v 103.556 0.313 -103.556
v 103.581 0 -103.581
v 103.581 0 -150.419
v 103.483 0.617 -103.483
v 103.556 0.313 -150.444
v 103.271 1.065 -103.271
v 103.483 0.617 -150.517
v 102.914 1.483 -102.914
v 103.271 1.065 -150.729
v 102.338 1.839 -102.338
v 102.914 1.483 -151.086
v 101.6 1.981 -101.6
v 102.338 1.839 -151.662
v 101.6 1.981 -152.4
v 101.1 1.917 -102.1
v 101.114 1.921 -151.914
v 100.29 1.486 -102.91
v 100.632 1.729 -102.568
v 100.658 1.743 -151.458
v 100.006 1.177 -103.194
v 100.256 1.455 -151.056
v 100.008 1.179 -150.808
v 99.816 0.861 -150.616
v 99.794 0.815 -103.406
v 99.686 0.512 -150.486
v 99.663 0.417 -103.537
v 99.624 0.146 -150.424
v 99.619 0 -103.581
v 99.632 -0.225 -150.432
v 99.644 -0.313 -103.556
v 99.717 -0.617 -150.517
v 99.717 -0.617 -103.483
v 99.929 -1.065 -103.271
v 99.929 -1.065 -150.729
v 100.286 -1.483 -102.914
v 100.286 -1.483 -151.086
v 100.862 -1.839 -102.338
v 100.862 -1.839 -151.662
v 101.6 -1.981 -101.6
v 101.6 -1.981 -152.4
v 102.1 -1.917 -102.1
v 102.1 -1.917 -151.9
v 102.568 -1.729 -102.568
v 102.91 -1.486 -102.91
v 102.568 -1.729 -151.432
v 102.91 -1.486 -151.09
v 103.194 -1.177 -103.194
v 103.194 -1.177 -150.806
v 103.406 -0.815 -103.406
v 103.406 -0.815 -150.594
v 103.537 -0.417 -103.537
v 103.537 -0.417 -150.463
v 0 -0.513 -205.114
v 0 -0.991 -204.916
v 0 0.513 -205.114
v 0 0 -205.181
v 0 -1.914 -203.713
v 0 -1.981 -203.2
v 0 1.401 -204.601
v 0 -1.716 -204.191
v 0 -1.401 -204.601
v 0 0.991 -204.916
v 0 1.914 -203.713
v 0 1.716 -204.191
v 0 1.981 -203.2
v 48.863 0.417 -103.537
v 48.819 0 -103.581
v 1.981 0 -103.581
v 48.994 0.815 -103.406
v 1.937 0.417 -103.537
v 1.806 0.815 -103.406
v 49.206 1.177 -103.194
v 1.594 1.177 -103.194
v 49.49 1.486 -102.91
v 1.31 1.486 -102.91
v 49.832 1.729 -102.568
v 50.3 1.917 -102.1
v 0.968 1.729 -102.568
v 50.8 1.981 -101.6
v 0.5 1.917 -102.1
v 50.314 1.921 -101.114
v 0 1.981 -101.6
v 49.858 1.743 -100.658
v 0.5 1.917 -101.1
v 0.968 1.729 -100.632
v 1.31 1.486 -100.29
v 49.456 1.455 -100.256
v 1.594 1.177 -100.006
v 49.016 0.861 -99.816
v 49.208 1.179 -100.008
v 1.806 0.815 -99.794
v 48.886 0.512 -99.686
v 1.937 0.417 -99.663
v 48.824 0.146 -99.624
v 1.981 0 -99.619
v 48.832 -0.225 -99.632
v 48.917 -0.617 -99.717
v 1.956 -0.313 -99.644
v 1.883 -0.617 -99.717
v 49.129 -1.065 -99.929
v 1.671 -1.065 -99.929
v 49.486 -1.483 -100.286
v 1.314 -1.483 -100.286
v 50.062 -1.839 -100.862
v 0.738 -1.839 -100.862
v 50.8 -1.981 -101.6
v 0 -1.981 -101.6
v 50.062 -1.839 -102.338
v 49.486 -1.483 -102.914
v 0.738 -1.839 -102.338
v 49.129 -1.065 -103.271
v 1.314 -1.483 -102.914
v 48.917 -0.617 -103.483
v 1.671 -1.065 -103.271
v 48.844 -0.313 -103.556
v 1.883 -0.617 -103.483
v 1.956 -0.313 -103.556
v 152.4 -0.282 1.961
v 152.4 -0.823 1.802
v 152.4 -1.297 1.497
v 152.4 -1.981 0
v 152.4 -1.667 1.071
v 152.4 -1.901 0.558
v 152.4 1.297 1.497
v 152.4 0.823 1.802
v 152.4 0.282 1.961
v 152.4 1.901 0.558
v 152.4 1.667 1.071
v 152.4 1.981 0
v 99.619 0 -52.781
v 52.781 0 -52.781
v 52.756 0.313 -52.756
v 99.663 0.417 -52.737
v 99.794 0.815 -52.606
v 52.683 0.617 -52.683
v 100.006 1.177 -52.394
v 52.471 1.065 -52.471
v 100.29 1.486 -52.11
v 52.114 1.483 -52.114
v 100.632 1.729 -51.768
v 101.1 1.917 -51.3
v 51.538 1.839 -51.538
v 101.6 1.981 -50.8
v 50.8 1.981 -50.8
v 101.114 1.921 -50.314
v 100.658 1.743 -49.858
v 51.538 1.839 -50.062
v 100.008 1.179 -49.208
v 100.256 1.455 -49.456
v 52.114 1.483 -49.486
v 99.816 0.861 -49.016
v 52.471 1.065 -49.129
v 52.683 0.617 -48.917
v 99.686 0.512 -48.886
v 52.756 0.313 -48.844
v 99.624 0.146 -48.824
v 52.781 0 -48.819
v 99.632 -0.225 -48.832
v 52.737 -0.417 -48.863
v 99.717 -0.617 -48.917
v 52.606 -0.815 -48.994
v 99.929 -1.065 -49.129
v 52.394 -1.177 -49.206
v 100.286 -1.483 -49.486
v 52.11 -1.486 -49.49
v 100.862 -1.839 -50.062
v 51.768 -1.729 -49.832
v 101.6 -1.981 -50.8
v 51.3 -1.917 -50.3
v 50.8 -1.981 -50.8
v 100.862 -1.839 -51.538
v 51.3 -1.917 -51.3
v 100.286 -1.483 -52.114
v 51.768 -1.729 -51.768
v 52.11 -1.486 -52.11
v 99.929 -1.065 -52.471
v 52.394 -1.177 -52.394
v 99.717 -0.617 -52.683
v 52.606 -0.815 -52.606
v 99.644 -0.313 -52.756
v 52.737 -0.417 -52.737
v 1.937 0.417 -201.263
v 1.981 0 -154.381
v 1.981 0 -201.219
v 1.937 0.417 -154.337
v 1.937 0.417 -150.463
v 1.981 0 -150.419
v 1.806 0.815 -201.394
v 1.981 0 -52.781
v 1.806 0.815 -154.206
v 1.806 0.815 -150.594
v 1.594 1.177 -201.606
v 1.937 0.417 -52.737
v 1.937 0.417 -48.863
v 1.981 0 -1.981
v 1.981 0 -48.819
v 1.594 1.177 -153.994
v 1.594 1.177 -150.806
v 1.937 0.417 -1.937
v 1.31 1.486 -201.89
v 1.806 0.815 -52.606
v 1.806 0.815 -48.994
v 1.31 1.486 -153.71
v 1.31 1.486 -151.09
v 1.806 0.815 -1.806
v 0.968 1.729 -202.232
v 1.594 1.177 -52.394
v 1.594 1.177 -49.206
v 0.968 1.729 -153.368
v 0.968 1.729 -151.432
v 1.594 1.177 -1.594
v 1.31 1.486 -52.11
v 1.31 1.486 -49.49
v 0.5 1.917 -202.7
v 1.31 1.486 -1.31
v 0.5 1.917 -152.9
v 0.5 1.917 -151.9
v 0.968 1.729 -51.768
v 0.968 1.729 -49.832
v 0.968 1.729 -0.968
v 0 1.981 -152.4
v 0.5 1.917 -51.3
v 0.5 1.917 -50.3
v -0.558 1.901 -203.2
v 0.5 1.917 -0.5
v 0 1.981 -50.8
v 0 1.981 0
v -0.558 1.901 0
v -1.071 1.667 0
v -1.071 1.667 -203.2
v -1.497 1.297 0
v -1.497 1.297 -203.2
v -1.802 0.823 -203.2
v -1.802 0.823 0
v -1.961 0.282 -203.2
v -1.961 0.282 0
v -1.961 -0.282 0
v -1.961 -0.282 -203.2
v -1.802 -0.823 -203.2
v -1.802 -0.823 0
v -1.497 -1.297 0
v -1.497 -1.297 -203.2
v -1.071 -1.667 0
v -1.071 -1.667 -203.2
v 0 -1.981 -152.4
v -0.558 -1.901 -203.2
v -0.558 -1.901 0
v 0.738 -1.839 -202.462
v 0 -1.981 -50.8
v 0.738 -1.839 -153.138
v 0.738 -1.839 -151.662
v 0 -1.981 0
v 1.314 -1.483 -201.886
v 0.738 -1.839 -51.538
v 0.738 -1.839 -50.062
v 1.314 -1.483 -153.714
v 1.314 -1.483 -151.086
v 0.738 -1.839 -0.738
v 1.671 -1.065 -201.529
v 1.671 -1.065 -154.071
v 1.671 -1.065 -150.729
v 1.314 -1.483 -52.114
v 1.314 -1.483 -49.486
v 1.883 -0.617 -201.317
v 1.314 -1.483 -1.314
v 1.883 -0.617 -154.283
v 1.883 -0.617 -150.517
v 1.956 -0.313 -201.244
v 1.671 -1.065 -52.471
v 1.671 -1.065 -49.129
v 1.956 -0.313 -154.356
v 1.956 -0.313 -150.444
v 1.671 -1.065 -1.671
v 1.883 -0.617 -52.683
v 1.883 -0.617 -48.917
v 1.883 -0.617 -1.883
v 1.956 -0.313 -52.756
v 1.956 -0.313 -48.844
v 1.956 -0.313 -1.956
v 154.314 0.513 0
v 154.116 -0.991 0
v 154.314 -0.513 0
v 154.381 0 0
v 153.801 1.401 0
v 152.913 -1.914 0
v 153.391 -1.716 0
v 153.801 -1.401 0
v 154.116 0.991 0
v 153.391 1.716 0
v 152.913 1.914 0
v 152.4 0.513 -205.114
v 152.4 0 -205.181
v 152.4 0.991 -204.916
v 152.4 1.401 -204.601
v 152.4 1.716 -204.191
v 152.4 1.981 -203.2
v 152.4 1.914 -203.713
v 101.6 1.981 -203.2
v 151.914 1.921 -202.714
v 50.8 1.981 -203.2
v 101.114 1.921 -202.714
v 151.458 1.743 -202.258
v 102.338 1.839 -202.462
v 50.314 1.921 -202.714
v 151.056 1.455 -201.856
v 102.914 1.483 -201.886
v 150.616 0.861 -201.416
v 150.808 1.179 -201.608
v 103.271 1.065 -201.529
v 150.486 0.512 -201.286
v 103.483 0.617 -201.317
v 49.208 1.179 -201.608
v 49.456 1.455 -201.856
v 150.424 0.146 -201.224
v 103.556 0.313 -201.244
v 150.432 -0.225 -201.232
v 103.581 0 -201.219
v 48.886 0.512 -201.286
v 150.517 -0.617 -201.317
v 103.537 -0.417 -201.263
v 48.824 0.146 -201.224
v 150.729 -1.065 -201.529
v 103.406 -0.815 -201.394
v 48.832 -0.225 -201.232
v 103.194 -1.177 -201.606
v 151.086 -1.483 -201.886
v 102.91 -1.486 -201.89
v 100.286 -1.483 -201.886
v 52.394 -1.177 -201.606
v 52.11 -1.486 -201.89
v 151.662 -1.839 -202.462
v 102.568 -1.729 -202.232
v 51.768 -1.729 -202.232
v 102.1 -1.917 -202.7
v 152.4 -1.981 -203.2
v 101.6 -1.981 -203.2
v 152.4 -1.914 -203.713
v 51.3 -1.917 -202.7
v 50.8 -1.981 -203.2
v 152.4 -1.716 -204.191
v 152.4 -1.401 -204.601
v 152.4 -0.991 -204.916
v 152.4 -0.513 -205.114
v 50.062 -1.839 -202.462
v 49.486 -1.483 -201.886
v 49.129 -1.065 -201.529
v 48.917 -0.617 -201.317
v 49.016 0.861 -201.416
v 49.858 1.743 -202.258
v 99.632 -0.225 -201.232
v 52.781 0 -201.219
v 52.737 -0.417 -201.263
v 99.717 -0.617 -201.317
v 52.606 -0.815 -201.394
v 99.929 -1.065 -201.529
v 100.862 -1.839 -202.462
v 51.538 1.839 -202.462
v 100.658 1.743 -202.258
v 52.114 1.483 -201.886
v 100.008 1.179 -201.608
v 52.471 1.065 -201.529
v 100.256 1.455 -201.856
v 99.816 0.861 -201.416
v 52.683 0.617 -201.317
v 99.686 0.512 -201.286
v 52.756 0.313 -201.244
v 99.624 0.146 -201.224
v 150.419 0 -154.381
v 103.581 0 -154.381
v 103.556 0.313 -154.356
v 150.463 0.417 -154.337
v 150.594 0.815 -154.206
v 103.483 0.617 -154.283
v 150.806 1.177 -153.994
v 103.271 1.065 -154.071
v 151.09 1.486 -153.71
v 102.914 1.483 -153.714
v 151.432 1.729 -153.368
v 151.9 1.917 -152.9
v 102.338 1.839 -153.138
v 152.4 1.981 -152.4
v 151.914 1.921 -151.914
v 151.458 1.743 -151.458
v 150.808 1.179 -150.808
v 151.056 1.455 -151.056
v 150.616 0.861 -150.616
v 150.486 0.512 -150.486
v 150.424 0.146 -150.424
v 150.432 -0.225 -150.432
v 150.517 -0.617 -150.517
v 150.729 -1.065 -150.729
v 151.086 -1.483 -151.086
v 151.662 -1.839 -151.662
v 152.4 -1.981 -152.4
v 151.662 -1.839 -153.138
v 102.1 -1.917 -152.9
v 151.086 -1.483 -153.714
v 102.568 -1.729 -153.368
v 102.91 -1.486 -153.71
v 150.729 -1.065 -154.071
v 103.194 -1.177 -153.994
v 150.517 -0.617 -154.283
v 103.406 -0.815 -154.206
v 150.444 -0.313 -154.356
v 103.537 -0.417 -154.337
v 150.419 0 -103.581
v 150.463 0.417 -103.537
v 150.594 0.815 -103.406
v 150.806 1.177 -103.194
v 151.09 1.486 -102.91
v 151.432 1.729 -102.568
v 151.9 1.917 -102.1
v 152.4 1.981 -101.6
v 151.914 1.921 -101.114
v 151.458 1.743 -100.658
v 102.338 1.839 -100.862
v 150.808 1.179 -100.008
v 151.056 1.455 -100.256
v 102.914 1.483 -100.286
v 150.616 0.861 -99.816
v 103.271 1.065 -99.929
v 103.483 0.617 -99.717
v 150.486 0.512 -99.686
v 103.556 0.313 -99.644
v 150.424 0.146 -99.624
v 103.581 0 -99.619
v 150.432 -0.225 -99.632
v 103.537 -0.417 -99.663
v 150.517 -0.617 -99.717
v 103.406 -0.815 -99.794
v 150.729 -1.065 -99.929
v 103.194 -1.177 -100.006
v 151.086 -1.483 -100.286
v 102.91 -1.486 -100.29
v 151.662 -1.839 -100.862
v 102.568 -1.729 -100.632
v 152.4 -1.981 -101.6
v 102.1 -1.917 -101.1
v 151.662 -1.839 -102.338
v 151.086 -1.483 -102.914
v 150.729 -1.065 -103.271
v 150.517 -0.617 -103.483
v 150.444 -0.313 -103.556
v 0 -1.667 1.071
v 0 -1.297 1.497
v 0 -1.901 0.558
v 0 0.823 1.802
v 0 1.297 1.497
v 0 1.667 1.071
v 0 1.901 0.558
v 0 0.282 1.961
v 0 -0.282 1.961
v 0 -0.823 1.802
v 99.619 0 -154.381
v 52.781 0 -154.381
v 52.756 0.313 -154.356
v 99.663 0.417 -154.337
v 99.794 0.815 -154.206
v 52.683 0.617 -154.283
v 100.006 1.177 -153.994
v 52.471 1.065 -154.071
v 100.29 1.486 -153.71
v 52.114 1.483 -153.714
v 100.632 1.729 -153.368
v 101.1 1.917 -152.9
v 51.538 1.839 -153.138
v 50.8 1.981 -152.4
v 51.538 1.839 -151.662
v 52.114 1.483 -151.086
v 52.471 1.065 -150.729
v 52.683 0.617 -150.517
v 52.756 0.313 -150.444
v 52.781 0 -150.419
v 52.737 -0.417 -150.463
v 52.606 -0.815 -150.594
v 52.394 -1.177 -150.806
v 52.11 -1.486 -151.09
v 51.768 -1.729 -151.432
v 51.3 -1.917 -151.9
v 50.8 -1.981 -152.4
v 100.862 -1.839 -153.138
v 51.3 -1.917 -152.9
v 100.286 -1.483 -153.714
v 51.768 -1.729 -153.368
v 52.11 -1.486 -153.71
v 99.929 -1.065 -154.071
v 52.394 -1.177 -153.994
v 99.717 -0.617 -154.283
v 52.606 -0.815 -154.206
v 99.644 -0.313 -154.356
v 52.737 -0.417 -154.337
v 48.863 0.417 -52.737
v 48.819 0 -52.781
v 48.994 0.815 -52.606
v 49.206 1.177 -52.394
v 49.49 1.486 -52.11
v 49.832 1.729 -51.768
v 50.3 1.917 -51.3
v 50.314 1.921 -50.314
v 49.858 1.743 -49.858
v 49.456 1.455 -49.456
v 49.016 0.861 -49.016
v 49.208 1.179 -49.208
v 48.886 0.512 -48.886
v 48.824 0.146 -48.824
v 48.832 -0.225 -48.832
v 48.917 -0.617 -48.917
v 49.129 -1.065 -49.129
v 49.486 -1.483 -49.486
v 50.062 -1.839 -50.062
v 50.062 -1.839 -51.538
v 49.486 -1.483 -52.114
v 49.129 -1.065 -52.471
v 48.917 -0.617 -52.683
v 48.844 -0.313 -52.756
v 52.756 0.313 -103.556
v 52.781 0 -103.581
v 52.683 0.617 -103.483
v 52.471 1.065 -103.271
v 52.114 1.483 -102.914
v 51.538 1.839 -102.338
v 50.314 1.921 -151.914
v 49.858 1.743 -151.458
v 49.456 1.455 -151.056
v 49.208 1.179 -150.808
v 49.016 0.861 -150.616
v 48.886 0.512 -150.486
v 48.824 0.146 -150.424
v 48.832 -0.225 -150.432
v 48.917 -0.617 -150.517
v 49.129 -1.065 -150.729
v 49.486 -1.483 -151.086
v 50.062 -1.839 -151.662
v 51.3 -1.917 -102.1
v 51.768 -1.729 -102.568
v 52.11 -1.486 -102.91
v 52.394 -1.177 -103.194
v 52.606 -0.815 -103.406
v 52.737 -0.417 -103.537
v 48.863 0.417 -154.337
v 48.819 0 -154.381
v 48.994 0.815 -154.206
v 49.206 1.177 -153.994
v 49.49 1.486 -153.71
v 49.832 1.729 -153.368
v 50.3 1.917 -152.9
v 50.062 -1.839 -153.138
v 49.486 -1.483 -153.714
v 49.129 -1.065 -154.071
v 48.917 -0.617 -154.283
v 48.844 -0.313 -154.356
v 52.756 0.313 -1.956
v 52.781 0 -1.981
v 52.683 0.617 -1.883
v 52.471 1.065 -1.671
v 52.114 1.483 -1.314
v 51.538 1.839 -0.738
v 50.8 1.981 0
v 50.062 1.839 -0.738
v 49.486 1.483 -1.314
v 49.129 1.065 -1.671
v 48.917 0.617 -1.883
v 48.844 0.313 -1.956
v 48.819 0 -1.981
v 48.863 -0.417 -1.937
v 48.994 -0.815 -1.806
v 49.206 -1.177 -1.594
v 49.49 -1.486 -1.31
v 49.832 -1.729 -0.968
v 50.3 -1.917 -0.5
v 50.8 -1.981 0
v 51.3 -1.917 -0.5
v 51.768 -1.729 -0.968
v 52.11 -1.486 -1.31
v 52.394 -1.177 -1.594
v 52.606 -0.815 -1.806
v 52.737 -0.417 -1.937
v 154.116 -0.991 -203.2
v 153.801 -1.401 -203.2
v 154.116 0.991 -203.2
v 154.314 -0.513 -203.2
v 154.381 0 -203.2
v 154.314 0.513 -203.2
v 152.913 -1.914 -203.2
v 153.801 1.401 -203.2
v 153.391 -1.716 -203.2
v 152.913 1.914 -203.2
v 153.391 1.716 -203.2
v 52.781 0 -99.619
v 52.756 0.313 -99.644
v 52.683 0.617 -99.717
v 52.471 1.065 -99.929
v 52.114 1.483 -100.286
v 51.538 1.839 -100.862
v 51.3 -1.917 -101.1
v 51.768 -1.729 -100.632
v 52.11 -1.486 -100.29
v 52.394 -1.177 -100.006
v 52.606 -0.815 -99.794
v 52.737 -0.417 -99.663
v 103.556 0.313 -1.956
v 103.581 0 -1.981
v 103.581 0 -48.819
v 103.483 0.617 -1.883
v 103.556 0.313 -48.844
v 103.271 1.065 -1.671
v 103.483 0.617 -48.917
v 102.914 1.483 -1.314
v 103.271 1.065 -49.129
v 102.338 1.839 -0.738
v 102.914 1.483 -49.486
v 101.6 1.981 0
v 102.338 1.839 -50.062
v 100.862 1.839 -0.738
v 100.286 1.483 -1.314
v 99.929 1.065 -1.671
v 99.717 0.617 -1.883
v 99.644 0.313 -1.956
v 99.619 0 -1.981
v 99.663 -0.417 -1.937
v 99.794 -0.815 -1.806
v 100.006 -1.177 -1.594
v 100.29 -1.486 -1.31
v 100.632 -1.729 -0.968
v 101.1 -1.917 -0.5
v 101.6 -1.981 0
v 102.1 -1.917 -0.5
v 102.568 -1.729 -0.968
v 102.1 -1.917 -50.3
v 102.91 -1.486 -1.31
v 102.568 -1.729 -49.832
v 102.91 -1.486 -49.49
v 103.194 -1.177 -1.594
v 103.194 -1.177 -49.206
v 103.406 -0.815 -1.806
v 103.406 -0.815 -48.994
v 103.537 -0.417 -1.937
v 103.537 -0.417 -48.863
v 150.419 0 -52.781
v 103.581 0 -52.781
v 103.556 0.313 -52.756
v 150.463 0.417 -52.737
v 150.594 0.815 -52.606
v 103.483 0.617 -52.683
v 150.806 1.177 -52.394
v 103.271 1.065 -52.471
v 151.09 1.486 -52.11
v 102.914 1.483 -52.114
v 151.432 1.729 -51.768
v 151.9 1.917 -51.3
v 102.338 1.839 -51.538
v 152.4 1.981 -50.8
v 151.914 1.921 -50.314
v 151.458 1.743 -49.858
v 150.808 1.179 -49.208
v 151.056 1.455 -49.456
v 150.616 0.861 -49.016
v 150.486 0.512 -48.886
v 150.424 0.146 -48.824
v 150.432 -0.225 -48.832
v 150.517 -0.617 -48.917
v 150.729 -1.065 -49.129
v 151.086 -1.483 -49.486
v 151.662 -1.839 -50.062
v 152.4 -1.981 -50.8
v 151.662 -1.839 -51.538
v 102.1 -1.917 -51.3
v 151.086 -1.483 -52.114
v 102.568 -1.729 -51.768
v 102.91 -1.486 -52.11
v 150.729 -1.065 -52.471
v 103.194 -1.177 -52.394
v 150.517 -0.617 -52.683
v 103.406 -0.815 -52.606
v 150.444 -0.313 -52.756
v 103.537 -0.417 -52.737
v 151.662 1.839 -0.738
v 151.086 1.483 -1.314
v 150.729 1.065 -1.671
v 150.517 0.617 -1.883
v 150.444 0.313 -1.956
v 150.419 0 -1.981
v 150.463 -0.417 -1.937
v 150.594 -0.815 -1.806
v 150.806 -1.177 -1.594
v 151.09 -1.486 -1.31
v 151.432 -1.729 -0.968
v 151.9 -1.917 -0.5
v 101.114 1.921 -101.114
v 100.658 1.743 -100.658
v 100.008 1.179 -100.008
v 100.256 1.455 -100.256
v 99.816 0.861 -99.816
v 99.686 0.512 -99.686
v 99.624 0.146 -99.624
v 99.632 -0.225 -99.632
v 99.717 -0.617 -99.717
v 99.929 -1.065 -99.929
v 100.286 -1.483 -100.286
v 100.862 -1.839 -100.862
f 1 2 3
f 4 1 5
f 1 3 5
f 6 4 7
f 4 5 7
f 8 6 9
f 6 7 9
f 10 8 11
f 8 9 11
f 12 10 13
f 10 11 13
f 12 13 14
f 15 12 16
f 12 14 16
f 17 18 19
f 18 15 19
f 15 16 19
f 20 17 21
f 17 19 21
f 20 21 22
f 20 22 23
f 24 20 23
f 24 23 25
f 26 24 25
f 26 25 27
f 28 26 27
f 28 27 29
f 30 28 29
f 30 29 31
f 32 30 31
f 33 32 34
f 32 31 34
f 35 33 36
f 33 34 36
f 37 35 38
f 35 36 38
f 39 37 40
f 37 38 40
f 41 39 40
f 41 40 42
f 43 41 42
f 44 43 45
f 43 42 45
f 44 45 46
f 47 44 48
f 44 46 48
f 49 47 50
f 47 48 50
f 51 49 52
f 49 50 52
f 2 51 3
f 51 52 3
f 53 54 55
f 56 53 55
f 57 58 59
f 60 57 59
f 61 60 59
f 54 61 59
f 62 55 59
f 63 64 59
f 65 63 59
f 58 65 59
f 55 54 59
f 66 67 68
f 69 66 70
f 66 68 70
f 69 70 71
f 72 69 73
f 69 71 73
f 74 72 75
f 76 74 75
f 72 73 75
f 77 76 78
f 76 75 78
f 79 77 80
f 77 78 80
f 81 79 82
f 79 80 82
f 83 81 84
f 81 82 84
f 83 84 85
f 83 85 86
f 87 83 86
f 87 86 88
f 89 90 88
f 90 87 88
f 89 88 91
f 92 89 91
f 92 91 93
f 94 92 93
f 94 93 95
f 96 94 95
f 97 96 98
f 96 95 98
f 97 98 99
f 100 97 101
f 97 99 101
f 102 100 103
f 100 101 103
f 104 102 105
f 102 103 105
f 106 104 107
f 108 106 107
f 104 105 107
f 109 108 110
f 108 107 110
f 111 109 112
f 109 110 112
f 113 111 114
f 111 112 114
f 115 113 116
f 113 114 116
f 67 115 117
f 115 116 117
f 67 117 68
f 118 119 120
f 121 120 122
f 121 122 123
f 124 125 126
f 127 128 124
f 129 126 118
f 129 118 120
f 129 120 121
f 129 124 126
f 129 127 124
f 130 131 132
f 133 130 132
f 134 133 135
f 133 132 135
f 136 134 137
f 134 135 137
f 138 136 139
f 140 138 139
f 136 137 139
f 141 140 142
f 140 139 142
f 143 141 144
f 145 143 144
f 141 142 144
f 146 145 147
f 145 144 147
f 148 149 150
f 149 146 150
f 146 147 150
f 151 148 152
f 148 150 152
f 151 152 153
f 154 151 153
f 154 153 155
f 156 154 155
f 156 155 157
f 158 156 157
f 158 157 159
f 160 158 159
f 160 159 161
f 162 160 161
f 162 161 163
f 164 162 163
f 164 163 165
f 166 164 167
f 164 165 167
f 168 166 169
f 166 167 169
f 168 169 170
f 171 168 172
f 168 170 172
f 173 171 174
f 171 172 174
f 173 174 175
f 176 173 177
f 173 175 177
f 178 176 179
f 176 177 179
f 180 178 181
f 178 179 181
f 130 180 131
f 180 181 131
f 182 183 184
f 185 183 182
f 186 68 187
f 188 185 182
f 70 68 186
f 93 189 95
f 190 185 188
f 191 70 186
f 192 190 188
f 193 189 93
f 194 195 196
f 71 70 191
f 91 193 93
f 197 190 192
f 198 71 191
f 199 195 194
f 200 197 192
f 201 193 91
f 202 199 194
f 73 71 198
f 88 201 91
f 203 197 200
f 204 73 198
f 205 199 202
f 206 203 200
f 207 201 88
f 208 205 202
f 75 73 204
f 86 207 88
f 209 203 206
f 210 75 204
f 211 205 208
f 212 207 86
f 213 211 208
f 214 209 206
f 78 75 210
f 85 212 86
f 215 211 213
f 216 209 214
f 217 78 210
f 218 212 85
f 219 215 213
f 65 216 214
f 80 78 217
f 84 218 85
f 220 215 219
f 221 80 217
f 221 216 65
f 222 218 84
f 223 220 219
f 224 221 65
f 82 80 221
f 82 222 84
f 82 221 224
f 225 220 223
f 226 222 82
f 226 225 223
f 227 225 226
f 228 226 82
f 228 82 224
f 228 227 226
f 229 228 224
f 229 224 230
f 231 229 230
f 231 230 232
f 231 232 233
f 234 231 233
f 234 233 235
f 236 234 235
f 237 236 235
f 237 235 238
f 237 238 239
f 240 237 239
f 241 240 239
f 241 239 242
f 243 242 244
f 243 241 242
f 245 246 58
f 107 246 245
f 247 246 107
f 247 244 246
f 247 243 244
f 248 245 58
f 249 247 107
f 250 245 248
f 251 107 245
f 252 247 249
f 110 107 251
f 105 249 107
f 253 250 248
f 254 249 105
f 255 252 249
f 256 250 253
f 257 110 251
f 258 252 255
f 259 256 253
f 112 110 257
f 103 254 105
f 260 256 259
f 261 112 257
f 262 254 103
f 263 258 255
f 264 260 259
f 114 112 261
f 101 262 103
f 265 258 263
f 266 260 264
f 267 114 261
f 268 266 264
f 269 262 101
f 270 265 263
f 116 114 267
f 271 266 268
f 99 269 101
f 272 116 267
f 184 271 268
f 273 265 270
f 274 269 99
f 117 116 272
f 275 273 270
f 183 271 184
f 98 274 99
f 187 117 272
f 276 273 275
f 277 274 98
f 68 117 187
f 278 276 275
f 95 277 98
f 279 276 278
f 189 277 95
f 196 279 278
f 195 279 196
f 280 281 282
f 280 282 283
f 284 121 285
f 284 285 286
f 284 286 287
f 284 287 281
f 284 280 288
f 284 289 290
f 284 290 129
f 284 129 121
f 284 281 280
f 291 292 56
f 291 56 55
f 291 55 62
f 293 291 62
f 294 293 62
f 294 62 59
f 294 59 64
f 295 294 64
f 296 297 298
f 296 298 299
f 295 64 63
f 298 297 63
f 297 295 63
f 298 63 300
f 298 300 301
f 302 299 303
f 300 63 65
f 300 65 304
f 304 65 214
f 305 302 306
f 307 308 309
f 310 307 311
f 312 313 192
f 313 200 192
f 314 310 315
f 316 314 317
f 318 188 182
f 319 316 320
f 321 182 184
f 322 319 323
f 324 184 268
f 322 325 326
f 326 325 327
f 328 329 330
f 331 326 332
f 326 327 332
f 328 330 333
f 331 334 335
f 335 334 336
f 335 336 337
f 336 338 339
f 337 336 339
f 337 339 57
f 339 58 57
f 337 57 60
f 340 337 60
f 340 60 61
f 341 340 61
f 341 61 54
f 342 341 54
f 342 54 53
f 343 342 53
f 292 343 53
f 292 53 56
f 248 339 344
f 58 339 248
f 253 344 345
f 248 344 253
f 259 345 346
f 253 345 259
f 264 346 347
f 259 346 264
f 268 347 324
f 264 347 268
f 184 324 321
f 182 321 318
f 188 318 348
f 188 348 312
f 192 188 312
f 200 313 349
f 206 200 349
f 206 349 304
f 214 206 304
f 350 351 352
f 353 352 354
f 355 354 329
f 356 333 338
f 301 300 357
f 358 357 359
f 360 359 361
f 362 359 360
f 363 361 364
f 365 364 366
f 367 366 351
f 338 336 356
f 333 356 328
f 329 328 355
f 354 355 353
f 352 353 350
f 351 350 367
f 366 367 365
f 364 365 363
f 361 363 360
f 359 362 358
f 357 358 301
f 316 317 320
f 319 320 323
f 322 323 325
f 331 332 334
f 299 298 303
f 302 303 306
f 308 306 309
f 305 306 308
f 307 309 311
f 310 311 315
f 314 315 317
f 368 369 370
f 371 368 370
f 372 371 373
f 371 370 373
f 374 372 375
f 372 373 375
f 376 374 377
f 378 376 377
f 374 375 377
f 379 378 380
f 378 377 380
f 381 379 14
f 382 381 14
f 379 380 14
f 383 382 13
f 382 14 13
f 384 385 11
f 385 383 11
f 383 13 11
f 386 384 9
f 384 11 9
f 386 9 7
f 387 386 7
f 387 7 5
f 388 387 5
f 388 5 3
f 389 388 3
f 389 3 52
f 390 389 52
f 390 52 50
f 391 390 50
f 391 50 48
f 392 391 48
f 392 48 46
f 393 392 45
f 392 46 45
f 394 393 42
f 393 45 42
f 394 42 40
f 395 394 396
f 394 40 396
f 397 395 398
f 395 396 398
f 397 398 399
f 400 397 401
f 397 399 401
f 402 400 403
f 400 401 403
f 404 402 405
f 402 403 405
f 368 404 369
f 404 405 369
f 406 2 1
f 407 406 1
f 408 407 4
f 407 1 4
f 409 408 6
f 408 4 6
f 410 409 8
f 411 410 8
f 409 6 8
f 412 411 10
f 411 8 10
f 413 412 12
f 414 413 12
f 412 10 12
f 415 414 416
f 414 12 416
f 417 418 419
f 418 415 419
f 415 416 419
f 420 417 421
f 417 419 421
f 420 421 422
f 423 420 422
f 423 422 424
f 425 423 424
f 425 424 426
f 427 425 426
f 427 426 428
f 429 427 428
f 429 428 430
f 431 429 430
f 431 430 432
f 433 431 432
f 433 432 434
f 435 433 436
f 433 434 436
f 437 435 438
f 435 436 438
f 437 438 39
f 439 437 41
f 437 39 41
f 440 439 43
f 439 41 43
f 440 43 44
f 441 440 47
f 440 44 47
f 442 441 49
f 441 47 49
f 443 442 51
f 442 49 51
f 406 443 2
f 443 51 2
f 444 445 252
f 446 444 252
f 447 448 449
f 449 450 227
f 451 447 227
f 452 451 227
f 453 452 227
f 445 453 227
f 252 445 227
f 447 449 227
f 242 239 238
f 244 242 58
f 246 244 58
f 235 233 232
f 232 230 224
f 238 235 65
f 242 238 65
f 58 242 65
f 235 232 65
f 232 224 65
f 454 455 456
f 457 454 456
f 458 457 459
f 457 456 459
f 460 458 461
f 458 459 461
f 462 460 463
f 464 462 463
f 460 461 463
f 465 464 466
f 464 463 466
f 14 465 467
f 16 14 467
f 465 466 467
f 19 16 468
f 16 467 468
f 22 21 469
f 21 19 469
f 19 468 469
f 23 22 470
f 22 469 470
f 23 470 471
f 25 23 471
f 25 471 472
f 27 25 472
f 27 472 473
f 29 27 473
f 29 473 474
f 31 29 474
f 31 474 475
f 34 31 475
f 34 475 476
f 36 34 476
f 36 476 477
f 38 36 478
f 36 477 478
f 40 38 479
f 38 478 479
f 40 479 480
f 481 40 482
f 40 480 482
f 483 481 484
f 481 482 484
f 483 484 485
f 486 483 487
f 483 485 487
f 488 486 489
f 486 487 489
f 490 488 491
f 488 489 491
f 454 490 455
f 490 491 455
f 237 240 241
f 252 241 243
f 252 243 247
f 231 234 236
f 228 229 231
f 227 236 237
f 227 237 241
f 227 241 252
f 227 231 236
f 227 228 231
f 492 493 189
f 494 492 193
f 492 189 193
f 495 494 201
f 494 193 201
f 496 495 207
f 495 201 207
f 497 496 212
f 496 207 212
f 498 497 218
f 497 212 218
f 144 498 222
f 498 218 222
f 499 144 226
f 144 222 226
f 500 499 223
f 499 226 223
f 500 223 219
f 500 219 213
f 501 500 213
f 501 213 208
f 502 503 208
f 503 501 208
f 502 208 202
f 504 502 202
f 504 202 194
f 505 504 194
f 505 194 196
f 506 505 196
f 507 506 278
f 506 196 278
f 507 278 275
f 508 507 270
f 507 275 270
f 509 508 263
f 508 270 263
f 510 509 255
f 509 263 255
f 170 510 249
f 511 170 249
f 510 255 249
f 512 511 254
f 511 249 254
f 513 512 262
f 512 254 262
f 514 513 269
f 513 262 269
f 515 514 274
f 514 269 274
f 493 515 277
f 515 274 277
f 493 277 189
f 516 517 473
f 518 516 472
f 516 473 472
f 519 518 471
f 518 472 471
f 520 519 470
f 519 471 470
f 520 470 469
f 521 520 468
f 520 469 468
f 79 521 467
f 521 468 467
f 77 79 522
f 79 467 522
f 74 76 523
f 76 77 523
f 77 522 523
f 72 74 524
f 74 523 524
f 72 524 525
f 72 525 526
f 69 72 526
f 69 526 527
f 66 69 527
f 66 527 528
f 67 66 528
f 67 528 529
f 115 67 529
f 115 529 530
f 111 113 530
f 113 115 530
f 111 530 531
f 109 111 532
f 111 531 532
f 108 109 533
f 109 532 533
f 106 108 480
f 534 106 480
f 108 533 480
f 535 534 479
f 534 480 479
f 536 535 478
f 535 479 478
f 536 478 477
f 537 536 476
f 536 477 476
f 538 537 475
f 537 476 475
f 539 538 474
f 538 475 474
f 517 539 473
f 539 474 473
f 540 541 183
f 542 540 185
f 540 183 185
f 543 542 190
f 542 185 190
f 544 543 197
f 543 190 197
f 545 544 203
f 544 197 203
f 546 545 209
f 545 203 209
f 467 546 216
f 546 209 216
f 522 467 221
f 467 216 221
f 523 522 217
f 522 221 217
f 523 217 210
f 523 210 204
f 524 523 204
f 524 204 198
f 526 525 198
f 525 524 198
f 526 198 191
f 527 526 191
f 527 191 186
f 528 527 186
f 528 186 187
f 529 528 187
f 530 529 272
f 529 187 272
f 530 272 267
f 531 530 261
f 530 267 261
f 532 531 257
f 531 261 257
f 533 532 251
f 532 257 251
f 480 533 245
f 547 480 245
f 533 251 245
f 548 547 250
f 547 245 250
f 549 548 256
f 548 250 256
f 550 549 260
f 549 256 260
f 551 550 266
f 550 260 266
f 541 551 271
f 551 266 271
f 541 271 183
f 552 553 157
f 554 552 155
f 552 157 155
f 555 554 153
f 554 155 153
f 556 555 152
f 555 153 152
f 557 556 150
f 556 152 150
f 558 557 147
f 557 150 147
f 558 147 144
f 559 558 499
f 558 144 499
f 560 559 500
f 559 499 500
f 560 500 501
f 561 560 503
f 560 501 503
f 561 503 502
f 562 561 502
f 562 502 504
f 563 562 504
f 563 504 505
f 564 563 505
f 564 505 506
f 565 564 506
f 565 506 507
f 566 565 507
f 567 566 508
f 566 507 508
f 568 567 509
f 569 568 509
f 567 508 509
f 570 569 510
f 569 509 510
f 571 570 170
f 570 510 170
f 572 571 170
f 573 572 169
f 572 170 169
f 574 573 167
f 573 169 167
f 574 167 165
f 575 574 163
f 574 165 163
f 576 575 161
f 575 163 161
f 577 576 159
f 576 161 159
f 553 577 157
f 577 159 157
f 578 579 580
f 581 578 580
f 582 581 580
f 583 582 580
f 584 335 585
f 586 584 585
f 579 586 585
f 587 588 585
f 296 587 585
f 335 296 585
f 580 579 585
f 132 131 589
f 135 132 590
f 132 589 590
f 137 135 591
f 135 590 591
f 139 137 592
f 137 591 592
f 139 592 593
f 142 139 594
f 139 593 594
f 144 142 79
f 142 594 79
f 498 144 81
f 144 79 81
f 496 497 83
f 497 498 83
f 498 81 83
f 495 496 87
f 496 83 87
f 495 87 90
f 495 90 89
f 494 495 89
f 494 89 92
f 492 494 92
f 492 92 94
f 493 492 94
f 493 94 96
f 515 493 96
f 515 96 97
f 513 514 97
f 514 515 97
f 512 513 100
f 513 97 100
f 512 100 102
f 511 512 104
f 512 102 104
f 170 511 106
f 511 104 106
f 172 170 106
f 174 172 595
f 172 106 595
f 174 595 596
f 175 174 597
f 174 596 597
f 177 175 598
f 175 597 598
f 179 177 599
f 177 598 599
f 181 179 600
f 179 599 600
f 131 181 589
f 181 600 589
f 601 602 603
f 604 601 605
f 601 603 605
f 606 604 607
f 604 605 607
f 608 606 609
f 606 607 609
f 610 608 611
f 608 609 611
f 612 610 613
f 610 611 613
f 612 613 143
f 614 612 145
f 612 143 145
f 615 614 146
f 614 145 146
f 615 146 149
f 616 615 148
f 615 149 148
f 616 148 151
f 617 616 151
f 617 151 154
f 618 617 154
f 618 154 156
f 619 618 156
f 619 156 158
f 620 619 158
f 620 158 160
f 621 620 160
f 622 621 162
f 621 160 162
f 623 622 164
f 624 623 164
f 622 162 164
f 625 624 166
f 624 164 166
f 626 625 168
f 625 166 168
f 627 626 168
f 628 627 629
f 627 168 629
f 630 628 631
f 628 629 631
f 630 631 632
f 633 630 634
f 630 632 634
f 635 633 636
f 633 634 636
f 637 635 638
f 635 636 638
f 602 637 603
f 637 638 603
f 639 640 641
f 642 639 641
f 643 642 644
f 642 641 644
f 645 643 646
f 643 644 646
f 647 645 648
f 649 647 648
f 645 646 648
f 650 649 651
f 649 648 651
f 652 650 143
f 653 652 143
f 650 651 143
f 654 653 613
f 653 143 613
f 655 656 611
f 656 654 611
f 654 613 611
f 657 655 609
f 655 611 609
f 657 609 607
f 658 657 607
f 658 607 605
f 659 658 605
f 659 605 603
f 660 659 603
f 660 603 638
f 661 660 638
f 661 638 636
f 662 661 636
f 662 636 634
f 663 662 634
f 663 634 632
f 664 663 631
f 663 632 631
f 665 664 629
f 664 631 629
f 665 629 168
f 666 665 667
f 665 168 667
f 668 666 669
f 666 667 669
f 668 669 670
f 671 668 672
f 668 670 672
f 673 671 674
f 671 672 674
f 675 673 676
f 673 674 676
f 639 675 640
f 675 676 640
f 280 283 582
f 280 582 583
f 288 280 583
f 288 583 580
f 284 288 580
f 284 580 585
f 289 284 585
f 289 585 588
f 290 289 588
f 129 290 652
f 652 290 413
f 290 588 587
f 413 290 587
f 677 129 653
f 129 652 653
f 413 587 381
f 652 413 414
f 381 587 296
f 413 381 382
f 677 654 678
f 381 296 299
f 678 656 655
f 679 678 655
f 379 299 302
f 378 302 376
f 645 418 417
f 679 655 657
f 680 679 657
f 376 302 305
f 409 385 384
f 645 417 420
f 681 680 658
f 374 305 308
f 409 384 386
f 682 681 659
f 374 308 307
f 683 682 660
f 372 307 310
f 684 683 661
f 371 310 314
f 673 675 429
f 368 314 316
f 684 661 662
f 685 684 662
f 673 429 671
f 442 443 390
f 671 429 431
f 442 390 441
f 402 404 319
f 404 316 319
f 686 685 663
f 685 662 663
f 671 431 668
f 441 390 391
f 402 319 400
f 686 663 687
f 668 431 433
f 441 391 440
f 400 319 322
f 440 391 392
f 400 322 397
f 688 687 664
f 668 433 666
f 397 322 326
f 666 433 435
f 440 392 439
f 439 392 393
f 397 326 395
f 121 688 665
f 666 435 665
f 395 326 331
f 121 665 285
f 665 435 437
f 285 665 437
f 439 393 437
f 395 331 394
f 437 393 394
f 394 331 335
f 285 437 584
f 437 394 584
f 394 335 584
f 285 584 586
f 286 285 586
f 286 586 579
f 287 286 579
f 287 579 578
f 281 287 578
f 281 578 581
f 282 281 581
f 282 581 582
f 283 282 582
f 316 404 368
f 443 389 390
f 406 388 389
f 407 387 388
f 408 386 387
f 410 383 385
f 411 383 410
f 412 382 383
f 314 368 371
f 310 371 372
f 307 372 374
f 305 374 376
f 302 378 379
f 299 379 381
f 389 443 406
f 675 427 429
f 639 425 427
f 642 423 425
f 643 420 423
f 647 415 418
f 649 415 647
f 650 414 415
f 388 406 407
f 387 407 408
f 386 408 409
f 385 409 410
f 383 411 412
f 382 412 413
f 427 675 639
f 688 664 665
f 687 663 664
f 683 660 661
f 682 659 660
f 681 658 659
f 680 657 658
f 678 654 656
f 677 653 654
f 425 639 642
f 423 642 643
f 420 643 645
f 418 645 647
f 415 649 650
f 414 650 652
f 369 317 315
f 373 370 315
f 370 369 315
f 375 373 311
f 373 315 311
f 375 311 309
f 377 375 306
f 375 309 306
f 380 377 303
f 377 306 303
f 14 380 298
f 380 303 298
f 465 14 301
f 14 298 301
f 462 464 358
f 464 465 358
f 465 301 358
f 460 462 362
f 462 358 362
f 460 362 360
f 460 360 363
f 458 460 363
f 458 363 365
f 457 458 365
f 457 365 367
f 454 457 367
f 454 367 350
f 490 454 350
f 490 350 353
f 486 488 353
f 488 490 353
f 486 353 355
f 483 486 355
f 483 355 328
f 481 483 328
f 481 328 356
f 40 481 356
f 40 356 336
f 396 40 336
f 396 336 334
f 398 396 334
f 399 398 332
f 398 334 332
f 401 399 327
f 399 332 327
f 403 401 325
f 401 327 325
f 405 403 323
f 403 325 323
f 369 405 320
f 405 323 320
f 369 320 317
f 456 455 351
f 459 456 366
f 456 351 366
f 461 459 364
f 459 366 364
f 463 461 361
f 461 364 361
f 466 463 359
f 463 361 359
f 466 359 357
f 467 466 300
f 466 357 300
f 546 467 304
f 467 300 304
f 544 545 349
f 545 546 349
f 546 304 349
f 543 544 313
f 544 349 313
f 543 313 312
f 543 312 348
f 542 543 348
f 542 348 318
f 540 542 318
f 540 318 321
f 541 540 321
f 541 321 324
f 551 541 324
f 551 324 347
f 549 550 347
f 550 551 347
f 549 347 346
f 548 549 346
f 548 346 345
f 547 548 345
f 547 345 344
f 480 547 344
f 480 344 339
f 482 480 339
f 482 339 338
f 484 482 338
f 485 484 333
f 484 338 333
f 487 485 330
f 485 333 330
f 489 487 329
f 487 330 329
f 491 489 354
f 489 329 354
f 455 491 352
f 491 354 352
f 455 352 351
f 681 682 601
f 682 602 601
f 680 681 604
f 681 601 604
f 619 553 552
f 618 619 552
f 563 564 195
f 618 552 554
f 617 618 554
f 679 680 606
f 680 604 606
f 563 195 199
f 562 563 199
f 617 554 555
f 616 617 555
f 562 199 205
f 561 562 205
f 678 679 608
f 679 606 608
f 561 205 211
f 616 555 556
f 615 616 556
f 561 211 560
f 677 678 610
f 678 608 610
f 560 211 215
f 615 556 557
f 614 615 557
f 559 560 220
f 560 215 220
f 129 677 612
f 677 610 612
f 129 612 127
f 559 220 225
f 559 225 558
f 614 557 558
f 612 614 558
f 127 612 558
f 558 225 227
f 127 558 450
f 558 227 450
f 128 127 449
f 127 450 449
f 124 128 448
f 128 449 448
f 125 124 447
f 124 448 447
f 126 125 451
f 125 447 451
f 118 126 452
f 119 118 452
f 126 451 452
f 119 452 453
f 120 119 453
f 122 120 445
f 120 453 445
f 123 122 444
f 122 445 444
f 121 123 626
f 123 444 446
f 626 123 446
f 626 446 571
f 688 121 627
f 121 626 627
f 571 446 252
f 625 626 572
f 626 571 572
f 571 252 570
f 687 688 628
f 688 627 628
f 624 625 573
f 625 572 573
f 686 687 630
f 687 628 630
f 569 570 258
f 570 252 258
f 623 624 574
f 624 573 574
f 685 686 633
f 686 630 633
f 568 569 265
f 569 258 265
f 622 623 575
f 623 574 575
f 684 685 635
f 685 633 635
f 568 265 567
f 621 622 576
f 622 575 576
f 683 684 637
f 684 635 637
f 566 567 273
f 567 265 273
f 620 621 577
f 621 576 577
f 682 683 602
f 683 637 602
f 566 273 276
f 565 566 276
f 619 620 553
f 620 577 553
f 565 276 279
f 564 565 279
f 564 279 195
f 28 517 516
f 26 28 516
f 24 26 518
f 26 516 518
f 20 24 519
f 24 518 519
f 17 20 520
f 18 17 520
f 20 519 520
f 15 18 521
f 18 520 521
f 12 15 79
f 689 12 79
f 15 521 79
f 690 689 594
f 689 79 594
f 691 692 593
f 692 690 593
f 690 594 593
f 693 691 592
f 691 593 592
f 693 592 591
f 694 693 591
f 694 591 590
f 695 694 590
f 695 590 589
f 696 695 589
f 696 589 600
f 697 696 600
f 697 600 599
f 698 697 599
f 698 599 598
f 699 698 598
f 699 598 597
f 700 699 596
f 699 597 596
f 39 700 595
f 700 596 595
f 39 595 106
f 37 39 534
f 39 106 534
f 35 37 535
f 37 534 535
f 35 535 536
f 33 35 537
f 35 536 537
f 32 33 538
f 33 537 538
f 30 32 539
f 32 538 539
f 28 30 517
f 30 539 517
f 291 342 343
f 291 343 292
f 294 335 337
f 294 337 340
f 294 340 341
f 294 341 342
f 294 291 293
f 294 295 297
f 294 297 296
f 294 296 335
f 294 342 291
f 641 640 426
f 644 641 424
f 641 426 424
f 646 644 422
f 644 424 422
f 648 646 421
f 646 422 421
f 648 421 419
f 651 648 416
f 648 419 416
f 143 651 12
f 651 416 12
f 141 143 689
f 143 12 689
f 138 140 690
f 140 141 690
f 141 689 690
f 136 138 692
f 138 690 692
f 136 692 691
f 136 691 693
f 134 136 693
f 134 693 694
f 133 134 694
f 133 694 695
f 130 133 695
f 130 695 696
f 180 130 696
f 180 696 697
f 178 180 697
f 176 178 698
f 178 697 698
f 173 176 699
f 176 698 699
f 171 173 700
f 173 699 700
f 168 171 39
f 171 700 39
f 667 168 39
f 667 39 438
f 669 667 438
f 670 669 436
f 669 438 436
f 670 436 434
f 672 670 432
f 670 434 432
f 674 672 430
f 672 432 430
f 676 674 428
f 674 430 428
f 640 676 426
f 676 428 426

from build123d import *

# Parameters (mm, degrees)
SKETCH1_R           = 1.9812
BASE_EXTRUDE_DEPTH  = 203.2
SKETCH2_R           = 1.9812
BOSS_EXTRUDE1_DEPTH = 152.4
LPATTERN1_START     = -203.2
LPATTERN1_OUTLINE_R = 1.9812
LPATTERN1_DEPTH     = 203.2
LPATTERN2_COUNT     = 5
LPATTERN2_PITCH     = 50.8


# Read off the part's stored shape, not the designer's step: LPattern1
with BuildPart() as part:
    # Sketch1 → Base-Extrude (new body)
    with BuildSketch(Plane.XY):
        Circle(SKETCH1_R)
    extrude(amount=-BASE_EXTRUDE_DEPTH)

    # Sketch2 → Boss-Extrude1 (add)
    with BuildSketch(Plane(origin=(0, 0, 0), x_dir=(0, 0, -1), z_dir=(1, 0, 0))):
        Circle(SKETCH2_R)
    boss_extrude1 = extrude(amount=BOSS_EXTRUDE1_DEPTH)

    # LPattern1 outline → LPattern1 (add)
    with BuildSketch(Plane.XY.offset(LPATTERN1_START)):
        with Locations((50.8, 0)):
            Circle(LPATTERN1_OUTLINE_R)
        with Locations((101.6, 0)):
            Circle(LPATTERN1_OUTLINE_R)
        with Locations((152.4, 0)):
            Circle(LPATTERN1_OUTLINE_R)
    extrude(amount=LPATTERN1_DEPTH)

    # LPattern2: Boss-Extrude1 ×5
    with Locations(*[(0, 0, -i * LPATTERN2_PITCH) for i in range(1, LPATTERN2_COUNT)]):
        add(boss_extrude1)


solid = part.part
